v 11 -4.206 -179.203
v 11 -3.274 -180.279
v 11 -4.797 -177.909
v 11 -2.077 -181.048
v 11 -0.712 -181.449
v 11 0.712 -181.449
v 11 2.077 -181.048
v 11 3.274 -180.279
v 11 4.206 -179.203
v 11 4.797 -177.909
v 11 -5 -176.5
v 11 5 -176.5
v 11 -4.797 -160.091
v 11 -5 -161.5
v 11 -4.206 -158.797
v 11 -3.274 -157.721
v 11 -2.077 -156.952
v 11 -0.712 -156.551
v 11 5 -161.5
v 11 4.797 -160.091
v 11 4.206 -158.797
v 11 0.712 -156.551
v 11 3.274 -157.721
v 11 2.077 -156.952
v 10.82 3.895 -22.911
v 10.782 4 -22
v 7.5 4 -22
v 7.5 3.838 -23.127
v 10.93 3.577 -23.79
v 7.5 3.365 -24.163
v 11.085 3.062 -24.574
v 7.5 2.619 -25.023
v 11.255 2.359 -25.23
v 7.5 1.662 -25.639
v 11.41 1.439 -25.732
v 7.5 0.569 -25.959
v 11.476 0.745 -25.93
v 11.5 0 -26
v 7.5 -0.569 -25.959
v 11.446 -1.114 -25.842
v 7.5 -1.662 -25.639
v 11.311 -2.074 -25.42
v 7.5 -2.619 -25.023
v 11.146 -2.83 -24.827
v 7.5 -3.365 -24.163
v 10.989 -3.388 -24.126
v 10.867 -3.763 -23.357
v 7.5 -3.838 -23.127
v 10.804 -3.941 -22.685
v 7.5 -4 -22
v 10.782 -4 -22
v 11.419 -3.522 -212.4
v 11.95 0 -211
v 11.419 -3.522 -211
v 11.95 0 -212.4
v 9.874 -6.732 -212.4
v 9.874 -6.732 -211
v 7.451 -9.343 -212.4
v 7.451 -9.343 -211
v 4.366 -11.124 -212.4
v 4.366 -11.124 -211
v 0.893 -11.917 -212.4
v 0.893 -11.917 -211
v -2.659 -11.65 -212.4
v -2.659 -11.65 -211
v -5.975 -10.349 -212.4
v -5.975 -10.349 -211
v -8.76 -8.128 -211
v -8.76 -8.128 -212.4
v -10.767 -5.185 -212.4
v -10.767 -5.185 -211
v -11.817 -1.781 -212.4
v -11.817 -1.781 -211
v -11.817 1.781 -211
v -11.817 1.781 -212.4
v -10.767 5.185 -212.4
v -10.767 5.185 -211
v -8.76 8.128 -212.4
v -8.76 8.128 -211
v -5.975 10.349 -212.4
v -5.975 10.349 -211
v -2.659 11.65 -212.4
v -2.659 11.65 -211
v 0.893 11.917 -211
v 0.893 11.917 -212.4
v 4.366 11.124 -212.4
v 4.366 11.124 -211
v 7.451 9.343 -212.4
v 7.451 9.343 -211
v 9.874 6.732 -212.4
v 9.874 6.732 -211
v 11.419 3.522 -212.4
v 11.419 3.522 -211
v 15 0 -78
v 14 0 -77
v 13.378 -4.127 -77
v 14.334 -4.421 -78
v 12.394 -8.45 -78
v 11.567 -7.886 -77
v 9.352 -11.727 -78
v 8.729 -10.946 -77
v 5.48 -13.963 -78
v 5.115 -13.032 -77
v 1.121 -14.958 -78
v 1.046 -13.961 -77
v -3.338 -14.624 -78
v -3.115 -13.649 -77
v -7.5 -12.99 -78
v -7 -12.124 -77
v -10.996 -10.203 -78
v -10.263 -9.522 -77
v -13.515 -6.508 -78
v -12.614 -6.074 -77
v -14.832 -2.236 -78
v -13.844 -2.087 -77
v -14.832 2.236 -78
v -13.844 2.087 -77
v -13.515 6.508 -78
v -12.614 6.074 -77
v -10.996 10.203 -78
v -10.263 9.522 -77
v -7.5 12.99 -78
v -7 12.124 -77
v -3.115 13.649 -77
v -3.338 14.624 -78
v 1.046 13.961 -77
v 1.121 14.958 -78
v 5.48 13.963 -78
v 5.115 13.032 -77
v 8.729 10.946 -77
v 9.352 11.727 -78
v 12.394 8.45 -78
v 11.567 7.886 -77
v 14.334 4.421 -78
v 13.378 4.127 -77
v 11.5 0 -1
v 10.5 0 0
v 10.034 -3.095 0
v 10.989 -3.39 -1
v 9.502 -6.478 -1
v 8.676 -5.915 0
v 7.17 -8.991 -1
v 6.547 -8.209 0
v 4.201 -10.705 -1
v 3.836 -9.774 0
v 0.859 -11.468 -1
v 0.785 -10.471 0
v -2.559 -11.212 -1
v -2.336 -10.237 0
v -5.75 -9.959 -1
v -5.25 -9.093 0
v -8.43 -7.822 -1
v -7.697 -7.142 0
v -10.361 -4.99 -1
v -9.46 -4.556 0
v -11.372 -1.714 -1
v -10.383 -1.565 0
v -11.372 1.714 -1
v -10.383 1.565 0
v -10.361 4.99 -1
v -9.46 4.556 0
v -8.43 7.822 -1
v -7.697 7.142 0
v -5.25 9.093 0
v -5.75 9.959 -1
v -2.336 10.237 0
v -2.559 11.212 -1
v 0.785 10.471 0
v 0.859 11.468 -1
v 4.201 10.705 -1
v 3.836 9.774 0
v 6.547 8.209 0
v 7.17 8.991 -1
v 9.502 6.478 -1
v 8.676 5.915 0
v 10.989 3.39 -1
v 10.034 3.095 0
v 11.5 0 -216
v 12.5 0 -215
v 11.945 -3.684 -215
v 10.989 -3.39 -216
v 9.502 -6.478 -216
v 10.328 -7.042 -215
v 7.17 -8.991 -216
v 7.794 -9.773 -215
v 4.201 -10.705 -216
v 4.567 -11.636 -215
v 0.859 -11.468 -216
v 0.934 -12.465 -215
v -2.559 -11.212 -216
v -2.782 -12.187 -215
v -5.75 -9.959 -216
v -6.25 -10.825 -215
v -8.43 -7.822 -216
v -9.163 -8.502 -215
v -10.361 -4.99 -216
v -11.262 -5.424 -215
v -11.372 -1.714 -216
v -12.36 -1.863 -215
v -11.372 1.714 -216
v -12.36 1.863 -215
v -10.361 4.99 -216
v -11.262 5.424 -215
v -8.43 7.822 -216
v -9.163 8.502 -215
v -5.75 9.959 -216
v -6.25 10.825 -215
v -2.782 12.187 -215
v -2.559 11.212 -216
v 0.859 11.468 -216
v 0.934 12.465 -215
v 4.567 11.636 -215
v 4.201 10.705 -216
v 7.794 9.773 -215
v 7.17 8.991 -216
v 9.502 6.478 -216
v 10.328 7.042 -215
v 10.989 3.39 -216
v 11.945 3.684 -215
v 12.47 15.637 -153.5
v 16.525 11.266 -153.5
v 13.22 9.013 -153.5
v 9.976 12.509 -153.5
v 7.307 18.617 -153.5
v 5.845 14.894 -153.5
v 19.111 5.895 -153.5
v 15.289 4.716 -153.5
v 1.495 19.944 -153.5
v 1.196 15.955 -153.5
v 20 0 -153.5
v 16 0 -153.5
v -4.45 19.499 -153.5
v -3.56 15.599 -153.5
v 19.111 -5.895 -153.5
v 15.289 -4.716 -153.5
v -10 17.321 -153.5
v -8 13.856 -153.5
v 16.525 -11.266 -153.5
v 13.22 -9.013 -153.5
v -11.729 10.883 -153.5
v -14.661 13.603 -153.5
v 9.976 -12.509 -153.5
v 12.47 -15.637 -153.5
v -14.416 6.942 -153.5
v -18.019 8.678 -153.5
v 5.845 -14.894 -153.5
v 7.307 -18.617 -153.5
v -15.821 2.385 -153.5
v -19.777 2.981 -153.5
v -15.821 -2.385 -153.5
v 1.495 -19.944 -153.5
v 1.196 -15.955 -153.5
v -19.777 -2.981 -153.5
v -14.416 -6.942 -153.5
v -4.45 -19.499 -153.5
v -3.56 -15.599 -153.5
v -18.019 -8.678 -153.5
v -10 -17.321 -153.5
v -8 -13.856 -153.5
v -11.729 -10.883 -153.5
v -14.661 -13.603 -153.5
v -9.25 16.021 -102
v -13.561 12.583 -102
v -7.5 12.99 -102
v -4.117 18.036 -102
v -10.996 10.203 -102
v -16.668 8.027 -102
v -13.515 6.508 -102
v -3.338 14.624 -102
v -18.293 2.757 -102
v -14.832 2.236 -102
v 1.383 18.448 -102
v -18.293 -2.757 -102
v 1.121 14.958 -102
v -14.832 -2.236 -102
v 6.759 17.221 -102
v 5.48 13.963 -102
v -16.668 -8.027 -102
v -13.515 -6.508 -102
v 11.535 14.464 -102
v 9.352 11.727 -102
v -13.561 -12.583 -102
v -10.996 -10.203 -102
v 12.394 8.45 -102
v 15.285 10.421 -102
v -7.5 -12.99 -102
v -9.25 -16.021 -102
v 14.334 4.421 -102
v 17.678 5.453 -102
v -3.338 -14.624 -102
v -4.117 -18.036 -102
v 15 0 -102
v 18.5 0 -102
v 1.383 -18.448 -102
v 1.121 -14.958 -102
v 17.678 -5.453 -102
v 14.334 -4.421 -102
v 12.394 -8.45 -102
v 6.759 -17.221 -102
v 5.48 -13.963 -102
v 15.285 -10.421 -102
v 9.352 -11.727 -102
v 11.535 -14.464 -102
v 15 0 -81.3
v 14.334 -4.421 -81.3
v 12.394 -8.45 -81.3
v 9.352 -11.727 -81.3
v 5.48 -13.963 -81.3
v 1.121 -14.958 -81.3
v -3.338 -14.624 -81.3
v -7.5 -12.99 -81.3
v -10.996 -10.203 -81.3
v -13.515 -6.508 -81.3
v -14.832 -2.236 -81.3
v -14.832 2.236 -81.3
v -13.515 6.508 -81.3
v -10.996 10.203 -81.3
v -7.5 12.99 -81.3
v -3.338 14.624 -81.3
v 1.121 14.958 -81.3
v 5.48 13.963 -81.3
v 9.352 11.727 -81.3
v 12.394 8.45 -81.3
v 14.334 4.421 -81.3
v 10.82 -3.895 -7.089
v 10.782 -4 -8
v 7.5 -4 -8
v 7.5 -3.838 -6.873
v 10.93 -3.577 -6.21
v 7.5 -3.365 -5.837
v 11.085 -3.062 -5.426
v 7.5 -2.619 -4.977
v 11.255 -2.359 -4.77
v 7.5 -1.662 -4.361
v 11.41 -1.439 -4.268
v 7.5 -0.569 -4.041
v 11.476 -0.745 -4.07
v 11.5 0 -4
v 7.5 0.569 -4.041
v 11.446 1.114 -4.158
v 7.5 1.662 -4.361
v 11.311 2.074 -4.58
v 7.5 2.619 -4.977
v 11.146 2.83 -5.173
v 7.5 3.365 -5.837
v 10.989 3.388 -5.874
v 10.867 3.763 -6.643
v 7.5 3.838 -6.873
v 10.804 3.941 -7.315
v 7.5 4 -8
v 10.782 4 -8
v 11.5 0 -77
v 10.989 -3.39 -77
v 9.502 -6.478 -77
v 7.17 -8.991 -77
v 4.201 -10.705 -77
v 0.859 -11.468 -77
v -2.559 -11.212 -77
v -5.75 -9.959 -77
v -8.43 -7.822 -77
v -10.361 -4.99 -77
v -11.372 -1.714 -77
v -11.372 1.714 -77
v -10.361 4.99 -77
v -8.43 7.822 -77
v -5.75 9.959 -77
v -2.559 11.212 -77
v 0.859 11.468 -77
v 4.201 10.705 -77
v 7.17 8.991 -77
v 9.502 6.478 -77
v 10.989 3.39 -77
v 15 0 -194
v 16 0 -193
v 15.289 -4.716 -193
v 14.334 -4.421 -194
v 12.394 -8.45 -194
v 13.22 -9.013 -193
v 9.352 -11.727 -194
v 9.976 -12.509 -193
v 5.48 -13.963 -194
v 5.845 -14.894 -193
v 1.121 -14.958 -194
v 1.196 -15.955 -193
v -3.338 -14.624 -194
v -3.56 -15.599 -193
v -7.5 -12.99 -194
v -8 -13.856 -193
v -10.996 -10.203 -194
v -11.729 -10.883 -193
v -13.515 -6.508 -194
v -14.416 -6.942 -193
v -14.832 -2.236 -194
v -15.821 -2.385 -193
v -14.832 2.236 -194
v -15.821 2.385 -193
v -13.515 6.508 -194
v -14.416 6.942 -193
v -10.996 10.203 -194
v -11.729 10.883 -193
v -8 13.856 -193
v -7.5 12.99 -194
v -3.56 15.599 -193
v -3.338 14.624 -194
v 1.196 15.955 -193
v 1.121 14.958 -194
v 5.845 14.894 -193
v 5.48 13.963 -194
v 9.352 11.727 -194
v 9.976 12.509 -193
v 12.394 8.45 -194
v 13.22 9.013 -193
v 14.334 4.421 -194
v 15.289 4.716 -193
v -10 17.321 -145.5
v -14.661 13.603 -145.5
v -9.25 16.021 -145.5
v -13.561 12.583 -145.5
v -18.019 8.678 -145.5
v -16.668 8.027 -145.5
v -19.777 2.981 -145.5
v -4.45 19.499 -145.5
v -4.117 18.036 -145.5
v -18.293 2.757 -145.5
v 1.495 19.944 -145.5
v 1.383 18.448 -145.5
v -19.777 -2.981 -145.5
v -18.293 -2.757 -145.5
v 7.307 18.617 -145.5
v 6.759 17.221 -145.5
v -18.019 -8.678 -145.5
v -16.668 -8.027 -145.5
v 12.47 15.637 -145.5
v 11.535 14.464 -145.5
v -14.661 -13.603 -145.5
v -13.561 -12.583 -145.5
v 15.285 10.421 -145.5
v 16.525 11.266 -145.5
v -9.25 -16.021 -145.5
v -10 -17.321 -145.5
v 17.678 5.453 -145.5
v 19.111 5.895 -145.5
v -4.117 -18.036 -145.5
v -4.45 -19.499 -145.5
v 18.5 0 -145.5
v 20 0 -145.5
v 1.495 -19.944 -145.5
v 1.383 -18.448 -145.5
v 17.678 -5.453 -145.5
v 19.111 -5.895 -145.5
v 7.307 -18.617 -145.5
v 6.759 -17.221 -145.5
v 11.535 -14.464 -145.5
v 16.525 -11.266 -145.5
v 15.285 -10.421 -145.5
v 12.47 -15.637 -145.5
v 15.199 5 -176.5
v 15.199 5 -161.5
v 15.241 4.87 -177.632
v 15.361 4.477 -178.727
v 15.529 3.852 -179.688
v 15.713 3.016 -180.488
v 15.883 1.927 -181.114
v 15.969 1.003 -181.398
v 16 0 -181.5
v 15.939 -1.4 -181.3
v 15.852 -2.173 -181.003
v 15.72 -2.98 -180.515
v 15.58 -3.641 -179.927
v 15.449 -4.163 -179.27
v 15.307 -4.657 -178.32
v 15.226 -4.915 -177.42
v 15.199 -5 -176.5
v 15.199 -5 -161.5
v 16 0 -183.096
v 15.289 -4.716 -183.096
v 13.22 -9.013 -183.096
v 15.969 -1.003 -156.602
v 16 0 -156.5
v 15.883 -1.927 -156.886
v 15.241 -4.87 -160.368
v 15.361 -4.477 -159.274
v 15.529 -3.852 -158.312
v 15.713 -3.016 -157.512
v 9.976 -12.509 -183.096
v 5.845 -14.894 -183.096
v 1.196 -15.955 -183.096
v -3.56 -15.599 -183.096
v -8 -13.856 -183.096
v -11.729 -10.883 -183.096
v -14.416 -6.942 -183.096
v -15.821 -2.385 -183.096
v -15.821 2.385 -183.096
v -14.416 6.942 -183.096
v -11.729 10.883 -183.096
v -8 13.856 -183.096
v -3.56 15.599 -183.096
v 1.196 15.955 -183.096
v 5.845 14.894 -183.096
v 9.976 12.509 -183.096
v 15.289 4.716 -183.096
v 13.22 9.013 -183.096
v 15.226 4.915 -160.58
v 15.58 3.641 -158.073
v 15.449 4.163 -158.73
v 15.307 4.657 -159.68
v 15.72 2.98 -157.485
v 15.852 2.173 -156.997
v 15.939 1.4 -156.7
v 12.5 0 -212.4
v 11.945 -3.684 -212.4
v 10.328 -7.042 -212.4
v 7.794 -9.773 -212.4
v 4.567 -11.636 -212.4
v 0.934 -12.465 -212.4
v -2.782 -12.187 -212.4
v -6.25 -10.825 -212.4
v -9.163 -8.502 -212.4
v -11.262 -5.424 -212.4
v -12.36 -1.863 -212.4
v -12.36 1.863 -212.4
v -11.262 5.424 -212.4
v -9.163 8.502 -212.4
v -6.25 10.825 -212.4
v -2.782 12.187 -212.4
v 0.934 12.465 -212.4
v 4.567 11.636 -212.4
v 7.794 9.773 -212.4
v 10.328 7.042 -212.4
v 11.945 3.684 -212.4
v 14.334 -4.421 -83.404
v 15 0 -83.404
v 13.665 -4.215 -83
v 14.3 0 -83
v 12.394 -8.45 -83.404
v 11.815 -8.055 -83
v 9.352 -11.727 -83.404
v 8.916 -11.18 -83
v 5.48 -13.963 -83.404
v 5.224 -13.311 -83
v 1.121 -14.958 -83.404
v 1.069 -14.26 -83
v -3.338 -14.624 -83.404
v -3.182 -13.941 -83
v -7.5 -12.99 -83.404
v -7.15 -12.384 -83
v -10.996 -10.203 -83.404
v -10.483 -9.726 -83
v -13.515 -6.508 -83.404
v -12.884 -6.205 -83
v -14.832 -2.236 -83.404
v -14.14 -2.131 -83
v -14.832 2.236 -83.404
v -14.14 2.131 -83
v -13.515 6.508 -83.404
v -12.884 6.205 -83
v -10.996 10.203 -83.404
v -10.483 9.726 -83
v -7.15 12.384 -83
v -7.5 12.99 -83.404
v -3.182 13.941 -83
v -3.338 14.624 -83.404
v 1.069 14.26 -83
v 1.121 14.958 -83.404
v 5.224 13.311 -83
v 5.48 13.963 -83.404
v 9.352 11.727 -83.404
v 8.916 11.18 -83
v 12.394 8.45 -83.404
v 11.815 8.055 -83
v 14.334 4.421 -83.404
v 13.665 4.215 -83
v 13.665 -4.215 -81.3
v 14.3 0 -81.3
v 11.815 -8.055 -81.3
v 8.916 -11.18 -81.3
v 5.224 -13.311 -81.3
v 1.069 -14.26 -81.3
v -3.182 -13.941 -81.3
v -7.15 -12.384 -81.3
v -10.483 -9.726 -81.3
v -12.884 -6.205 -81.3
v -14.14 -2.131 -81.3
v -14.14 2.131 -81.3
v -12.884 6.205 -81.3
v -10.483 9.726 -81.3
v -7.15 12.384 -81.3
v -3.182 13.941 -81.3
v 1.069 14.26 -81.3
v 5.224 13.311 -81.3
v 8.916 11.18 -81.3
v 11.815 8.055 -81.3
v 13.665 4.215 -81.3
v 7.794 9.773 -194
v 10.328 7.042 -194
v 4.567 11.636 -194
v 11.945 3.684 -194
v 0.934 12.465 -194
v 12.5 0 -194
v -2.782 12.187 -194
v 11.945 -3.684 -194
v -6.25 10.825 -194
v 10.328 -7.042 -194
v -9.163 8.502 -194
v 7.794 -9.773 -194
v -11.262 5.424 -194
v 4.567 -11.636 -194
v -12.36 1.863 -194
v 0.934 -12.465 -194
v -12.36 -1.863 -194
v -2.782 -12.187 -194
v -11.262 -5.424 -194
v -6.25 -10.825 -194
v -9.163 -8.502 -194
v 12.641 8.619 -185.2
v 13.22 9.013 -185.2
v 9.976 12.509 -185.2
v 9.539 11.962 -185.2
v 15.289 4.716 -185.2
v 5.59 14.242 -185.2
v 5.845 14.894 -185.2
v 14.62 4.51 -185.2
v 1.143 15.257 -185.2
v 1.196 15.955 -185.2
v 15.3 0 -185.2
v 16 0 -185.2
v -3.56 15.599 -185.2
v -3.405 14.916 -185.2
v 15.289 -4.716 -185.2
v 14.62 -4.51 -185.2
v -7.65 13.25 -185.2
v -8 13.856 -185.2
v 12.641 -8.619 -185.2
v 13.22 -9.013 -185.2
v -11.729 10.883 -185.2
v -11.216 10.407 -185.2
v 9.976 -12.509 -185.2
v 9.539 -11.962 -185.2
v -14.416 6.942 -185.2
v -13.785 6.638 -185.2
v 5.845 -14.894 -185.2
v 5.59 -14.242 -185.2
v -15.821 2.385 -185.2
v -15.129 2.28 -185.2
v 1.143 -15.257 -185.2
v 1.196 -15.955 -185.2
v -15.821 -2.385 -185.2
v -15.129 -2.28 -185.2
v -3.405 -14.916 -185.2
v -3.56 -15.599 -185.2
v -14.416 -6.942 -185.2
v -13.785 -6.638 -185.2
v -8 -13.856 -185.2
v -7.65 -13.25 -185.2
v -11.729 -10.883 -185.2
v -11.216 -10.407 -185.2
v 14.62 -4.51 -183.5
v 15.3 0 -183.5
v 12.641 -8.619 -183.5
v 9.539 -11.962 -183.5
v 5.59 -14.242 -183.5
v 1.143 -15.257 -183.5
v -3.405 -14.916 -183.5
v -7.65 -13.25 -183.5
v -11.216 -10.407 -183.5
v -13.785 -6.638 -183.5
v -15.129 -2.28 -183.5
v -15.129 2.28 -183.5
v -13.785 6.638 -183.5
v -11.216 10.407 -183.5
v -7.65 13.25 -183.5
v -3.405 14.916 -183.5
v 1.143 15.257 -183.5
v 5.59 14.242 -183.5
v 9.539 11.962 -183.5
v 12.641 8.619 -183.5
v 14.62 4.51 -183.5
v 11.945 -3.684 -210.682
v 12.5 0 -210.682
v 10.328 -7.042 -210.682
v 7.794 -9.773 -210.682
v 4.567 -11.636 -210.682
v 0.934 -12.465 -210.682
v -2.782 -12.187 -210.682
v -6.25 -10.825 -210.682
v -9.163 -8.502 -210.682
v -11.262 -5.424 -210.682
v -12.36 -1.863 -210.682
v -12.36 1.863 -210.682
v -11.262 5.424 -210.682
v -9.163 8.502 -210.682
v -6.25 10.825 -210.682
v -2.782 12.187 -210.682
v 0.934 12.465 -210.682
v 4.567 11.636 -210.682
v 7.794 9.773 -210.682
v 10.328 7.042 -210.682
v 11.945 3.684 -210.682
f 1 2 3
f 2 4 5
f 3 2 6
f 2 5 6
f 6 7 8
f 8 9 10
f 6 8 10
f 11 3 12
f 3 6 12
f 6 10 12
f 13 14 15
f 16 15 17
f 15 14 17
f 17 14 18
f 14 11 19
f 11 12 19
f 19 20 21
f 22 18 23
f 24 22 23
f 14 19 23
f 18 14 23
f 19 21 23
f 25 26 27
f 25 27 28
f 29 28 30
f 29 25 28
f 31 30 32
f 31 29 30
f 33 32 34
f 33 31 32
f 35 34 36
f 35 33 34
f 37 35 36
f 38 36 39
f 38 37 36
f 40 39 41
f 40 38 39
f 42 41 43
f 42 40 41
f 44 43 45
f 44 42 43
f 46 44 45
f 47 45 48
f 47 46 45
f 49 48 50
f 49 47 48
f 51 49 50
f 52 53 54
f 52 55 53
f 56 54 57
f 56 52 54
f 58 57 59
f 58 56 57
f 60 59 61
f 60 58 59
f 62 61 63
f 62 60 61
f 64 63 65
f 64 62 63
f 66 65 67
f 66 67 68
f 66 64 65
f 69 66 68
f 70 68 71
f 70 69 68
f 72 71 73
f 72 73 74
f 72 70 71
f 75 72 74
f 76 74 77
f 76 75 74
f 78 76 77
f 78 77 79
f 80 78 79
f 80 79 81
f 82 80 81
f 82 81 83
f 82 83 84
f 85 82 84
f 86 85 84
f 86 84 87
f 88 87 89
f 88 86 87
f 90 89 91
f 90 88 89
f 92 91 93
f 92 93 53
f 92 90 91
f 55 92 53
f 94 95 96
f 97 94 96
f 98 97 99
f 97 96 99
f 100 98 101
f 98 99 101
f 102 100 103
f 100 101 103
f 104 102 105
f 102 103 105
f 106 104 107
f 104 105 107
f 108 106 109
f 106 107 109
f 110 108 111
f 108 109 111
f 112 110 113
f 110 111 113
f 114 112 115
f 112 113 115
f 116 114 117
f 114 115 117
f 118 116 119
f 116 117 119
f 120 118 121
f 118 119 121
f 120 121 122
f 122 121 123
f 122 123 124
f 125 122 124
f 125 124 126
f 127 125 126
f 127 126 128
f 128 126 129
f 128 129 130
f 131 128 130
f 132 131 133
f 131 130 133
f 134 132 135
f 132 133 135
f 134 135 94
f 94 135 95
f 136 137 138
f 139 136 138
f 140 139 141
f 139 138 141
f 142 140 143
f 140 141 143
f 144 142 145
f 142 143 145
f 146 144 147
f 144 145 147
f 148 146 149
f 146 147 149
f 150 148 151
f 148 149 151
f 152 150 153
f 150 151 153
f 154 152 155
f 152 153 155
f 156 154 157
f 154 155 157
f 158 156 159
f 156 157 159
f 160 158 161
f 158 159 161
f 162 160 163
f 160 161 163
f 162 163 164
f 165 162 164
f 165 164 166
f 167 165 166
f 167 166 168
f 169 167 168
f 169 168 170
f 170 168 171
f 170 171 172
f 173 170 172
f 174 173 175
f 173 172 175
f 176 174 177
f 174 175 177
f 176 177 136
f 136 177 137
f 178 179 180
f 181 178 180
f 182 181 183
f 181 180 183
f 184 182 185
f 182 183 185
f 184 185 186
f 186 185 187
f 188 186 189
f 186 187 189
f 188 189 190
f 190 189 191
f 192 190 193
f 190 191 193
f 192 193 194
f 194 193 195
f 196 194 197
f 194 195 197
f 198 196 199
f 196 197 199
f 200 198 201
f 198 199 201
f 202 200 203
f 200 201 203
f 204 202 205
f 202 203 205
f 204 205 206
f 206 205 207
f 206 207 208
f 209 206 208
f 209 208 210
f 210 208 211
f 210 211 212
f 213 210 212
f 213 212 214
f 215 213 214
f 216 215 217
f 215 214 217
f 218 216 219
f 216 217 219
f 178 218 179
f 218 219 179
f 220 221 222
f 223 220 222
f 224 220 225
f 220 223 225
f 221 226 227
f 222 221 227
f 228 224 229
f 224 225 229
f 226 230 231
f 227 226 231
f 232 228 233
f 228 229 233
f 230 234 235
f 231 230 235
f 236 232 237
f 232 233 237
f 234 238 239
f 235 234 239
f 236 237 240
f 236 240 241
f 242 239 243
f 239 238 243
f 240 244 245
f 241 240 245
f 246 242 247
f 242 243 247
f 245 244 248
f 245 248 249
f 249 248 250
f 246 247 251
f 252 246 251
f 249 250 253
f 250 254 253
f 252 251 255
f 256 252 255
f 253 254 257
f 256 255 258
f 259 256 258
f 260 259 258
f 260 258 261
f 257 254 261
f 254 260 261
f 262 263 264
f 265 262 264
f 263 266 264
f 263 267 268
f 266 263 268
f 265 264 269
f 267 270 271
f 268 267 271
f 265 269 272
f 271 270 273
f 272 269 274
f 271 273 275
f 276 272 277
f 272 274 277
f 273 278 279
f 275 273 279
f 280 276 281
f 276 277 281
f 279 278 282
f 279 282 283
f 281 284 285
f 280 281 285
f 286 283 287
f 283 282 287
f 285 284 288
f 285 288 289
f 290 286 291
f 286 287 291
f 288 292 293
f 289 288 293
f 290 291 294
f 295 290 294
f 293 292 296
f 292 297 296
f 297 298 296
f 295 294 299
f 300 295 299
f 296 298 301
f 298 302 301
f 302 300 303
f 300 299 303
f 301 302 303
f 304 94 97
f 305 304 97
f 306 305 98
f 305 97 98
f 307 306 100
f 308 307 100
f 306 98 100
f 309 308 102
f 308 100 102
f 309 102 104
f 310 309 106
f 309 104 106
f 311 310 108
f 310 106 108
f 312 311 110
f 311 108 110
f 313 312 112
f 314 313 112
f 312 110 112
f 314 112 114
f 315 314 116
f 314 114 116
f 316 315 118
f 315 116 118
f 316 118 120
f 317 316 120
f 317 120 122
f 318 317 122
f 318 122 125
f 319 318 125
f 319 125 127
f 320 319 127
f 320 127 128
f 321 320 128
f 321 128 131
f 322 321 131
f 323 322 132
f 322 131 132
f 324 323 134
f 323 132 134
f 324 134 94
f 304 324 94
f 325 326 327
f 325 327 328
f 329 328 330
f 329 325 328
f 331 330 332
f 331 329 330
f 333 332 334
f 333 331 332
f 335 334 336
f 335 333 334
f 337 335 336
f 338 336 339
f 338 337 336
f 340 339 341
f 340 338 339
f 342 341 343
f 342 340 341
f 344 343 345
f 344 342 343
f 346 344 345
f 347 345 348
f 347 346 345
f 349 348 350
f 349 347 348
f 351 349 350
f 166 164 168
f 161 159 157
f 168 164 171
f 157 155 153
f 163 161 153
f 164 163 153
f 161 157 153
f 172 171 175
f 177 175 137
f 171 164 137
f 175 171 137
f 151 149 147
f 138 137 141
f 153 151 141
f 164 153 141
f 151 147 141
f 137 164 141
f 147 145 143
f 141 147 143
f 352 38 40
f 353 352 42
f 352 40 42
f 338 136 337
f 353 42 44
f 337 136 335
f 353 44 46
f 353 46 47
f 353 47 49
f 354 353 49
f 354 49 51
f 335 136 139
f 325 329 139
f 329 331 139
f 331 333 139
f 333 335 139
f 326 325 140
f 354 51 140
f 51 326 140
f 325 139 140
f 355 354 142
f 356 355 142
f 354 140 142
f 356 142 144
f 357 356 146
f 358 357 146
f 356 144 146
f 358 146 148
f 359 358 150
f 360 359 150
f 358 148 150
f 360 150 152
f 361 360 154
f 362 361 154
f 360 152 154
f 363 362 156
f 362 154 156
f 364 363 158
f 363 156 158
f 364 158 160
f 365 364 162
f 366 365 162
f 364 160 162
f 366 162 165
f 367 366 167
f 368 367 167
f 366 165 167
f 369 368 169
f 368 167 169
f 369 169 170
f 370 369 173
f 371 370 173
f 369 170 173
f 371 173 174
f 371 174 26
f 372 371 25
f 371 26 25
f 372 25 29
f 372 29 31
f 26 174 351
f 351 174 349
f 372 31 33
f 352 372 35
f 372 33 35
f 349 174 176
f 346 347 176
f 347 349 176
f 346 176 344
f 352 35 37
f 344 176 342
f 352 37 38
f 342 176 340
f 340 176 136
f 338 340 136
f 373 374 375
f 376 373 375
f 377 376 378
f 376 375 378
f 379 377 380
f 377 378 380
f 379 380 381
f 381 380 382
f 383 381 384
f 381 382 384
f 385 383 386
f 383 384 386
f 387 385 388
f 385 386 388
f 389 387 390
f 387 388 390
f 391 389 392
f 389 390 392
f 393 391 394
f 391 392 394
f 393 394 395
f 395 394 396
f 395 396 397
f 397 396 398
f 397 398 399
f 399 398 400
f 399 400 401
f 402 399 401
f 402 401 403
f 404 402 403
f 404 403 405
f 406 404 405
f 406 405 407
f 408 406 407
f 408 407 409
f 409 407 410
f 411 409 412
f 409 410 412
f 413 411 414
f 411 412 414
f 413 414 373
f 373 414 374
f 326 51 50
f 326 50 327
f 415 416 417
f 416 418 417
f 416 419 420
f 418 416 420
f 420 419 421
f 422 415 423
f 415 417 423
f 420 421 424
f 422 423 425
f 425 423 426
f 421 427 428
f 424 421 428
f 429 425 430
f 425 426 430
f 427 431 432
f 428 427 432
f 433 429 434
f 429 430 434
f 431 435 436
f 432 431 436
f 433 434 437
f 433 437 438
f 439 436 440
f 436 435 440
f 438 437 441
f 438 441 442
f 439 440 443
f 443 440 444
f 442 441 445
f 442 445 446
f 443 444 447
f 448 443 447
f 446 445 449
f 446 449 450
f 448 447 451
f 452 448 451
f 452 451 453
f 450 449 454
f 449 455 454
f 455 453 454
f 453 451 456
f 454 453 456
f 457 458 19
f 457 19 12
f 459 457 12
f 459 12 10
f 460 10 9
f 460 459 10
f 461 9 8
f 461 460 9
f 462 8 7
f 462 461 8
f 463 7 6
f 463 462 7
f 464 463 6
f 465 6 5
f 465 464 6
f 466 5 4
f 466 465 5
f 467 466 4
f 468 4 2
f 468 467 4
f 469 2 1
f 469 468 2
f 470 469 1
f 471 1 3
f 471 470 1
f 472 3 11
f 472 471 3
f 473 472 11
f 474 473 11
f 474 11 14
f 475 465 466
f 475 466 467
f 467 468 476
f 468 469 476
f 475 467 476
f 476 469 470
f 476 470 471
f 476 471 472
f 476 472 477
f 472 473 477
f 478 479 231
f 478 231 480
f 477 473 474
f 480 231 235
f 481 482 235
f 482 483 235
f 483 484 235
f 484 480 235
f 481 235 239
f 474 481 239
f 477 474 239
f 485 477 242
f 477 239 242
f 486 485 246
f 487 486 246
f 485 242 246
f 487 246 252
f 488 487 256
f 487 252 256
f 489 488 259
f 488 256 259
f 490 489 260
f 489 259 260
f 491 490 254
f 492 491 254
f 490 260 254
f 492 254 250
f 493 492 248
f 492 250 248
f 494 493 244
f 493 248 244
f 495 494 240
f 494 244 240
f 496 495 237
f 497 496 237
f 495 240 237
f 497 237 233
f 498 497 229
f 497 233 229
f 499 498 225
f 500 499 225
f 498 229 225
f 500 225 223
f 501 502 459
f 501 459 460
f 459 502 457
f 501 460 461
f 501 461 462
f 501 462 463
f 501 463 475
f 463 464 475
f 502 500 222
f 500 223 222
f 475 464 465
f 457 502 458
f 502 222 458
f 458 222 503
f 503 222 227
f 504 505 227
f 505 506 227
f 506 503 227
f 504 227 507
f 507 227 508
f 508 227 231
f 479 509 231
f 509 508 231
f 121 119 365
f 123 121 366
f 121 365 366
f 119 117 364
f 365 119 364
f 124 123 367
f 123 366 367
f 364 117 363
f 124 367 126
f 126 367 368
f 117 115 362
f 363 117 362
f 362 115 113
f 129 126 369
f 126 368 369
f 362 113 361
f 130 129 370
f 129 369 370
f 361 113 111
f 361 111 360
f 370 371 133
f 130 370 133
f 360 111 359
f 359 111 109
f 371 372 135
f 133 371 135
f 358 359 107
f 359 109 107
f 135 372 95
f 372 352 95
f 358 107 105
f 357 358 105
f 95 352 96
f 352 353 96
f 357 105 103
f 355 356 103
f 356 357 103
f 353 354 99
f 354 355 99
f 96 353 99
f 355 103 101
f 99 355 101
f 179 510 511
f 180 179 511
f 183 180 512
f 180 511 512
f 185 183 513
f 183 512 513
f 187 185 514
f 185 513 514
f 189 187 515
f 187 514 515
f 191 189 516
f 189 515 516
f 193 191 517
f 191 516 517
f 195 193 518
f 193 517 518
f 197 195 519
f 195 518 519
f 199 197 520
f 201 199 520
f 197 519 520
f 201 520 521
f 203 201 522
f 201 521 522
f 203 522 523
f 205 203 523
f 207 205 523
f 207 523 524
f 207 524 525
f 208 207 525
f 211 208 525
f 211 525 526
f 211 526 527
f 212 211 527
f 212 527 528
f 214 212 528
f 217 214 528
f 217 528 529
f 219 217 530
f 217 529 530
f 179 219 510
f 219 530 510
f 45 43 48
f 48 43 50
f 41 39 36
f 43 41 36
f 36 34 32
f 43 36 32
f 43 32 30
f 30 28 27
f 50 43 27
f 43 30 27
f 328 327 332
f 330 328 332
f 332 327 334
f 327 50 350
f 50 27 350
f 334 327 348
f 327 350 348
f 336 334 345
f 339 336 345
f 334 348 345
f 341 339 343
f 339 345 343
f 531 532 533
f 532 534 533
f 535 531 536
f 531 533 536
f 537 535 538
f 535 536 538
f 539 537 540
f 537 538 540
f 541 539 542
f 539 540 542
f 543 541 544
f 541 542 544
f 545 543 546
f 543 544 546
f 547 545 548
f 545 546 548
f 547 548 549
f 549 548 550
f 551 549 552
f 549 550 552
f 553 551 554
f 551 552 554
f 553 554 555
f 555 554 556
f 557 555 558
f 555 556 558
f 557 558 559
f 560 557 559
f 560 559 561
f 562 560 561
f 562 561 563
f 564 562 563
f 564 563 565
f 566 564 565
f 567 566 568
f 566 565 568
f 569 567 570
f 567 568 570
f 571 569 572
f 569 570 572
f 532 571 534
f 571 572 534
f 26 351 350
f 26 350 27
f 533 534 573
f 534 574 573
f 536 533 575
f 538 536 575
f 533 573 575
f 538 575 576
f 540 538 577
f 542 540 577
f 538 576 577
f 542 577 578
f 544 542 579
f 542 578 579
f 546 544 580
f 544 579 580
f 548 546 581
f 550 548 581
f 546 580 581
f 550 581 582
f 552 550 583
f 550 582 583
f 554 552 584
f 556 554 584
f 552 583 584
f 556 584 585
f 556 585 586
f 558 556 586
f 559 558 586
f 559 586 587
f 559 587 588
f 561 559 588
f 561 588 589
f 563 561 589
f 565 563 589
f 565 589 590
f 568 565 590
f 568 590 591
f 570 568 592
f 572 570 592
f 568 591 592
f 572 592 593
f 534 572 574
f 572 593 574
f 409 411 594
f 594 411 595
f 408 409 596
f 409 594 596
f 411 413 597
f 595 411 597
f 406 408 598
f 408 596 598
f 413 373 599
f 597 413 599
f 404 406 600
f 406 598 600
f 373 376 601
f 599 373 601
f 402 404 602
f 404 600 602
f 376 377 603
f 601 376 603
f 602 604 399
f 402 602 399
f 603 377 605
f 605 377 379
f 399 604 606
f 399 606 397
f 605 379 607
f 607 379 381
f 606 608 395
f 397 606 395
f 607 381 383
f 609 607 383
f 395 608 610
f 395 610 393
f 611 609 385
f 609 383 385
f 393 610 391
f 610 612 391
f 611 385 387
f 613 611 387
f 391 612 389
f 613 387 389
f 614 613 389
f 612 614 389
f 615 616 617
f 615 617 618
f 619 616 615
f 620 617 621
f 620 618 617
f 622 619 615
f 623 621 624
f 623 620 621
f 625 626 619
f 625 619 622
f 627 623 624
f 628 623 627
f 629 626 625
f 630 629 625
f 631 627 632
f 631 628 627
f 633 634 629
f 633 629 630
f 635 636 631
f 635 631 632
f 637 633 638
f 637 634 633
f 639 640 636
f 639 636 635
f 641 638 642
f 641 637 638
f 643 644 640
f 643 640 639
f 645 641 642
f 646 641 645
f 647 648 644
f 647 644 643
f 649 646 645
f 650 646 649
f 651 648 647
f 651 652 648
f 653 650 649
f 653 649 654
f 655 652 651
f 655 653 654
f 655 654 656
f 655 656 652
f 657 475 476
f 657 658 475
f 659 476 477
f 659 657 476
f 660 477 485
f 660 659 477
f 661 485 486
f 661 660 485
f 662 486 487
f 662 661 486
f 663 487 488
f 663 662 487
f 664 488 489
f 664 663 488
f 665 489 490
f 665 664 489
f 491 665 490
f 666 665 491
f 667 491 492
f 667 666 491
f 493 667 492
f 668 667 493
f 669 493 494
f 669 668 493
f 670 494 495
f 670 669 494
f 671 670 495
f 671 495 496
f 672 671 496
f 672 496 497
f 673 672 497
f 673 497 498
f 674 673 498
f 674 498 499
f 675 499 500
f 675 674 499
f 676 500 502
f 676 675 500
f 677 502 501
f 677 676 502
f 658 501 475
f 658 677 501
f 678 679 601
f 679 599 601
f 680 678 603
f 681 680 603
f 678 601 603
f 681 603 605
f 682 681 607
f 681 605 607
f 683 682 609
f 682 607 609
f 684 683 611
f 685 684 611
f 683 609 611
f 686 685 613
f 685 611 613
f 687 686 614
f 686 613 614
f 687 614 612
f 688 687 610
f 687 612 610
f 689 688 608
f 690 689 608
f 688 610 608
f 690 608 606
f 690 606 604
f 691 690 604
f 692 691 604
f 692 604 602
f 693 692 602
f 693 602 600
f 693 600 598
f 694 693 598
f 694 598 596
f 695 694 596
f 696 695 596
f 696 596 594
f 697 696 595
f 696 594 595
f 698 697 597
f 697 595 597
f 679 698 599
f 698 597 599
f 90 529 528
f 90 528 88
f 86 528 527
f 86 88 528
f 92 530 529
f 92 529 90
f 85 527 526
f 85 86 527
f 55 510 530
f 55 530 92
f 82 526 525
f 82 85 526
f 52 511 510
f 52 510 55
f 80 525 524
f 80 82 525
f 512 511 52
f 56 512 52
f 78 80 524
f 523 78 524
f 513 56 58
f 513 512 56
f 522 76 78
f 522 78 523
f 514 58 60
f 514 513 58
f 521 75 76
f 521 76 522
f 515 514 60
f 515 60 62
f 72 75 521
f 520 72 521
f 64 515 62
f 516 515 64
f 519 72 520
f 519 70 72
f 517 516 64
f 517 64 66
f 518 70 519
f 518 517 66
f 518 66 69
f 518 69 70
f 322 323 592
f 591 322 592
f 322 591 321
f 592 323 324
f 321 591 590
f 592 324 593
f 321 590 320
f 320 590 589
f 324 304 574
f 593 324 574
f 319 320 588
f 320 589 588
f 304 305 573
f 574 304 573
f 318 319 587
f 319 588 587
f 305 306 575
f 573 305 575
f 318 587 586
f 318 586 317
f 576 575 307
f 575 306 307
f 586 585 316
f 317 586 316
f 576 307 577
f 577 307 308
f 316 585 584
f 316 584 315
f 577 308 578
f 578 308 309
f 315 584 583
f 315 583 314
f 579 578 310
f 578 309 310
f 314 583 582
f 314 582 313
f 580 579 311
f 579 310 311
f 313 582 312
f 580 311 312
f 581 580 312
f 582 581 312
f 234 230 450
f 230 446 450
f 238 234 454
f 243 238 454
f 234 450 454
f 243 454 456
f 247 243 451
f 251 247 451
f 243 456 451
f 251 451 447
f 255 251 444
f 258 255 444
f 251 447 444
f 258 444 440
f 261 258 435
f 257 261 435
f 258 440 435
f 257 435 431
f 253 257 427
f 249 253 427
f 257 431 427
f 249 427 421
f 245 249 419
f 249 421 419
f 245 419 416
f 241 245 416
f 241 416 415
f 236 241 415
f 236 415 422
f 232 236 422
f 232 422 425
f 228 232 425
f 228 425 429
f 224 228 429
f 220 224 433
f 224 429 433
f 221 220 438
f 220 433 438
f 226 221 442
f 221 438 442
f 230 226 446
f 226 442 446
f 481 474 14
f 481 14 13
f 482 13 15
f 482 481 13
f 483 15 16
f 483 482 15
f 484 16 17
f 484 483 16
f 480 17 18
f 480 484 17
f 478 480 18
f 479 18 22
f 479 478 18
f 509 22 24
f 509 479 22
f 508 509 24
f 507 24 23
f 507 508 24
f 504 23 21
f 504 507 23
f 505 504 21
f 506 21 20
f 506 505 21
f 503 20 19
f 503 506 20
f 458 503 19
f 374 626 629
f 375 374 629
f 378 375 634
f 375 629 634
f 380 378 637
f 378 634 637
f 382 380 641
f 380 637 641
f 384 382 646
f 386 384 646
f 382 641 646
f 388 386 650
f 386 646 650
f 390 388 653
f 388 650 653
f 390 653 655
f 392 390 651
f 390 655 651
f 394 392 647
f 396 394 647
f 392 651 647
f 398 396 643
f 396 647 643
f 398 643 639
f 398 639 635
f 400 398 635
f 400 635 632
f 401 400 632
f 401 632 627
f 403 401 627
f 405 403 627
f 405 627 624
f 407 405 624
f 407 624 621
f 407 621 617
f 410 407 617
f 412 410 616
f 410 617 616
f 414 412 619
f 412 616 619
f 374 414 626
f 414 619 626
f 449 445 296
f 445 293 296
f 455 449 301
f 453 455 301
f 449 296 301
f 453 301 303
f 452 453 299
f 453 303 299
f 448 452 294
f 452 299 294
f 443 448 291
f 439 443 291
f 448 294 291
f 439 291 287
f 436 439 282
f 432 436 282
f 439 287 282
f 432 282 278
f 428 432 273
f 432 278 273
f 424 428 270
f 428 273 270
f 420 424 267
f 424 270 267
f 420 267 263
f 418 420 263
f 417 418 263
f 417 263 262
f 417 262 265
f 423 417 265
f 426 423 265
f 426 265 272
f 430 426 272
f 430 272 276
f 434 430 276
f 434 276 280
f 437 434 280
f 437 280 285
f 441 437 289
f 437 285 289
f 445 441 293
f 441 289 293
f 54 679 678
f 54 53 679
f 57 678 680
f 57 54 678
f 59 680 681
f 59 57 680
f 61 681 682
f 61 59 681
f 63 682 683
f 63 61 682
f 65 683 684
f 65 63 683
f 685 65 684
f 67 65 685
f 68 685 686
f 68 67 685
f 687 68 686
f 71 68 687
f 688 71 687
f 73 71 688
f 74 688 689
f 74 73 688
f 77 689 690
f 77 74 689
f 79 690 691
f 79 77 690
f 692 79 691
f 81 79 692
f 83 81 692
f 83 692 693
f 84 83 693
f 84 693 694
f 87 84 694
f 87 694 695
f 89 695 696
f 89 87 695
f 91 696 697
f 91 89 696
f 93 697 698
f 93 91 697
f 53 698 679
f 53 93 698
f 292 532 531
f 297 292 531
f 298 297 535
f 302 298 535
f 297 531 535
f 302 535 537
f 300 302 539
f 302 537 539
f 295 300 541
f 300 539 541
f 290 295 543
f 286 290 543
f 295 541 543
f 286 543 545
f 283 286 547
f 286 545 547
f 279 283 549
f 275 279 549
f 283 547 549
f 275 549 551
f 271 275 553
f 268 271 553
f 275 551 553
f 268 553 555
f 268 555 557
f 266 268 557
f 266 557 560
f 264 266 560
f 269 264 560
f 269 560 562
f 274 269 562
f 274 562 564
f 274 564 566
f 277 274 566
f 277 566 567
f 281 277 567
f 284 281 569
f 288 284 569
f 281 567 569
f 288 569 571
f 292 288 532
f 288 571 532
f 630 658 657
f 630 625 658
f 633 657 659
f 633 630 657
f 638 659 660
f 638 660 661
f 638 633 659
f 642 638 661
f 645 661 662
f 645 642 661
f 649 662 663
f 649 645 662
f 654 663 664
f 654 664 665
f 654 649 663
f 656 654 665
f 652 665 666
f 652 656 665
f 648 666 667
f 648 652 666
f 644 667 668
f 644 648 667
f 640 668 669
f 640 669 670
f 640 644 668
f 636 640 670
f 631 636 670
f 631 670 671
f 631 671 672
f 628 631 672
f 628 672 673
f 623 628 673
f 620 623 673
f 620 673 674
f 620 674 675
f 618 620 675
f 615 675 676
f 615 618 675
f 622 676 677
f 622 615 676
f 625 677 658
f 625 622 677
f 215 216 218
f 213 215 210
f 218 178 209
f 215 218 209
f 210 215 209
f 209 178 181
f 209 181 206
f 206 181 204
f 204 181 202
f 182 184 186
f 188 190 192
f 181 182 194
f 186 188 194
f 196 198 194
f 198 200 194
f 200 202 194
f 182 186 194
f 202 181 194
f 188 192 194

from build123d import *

# Parameters (mm, degrees)
TAGLIO_ESTRUSIONE4_START = 16
TAGLIO_ESTRUSIONE4_DEPTH = 5
TAGLIO_ESTRUSIONE5_START = 11.5
TAGLIO_ESTRUSIONE5_DEPTH = 4
SMUSSO5_SIZE             = 1


with BuildPart() as part:
    # Schizzo4 → Rivoluzione1 (revolve)
    with BuildSketch(Plane(origin=(0, 0, 0), x_dir=(0, 0, -1), z_dir=(1, 0, 0)), mode=Mode.PRIVATE) as rivoluzione1_sk:
        Polygon((0, 0), (216, 0), (216, 12.5), (194, 12.5), (194, 16), (153.5, 16), (153.5, 20), (145.5, 20), (145.5, 18.5), (102, 18.5), (102, 15), (77, 15), (77, 11.5), (0, 11.5), align=None)
    revolve(rivoluzione1_sk.sketch.rotate(Axis((0, 0, 0), (0, 0, -1)), 90), axis=Axis((0, 0, 0), (0, 0, -1)))

    # Schizzo10 → Taglia-Rivoluzione1 (revolve, cut)
    with BuildSketch(Plane(origin=(0, 0, 0), x_dir=(0, 0, -1), z_dir=(1, 0, 0)), mode=Mode.PRIVATE) as taglia_rivoluzione1_sk:
        Polygon((183.095854812, 16), (183.5, 15.3), (185.2, 15.3), (185.2, 16), align=None)
    revolve(taglia_rivoluzione1_sk.sketch.rotate(Axis((0, 0, -141.39065809), (0, 0, -1)), 90), axis=Axis((0, 0, -141.39065809), (0, 0, -1)), mode=Mode.SUBTRACT)

    # Schizzo11 → Taglia-Rivoluzione2 (revolve, cut)
    with BuildSketch(Plane(origin=(0, 0, 0), x_dir=(0, 0, -1), z_dir=(1, 0, 0)), mode=Mode.PRIVATE) as taglia_rivoluzione2_sk:
        Polygon((210.682457352, 12.5), (211, 11.95), (212.4, 11.95), (212.4, 12.5), align=None)
    revolve(taglia_rivoluzione2_sk.sketch.rotate(Axis((0, 0, -146.205163042), (0, 0, -1)), 90), axis=Axis((0, 0, -146.205163042), (0, 0, -1)), mode=Mode.SUBTRACT)

    # Schizzo12 → Taglia-Rivoluzione3 (revolve, cut)
    with BuildSketch(Plane(origin=(0, 0, 0), x_dir=(0, 0, -1), z_dir=(1, 0, 0)), mode=Mode.PRIVATE) as taglia_rivoluzione3_sk:
        Polygon((83.404145188, 15), (83, 14.3), (81.3, 14.3), (81.3, 15), align=None)
    revolve(taglia_rivoluzione3_sk.sketch.rotate(Axis((0, 0, -46.884155284), (0, 0, -1)), 90), axis=Axis((0, 0, -46.884155284), (0, 0, -1)), mode=Mode.SUBTRACT)

    # Schizzo6 → Taglio-Estrusione4 (cut)
    with BuildSketch(Plane(origin=(0, 0, 0), x_dir=(0, 0, -1), z_dir=(1, 0, 0)).offset(TAGLIO_ESTRUSIONE4_START)):
        with BuildLine():
            Line((161.5, 5), (176.5, 5))
            ThreePointArc((176.5, 5), (181.5, 0), (176.5, -5))
            Line((176.5, -5), (161.5, -5))
            ThreePointArc((161.5, -5), (156.5, 0), (161.5, 5))
        make_face()
    extrude(amount=-TAGLIO_ESTRUSIONE4_DEPTH, mode=Mode.SUBTRACT)

    # Schizzo8 → Taglio-Estrusione5 (cut)
    with BuildSketch(Plane(origin=(0, 0, 0), x_dir=(0, 0, -1), z_dir=(1, 0, 0)).offset(TAGLIO_ESTRUSIONE5_START)):
        with BuildLine():
            Line((8, 4), (22, 4))
            ThreePointArc((22, 4), (26, 0), (22, -4))
            Line((22, -4), (8, -4))
            ThreePointArc((8, -4), (4, 0), (8, 4))
        make_face()
    extrude(amount=-TAGLIO_ESTRUSIONE5_DEPTH, mode=Mode.SUBTRACT)

    # Smusso5
    smusso5_edges = [part.edges().sort_by_distance(p)[0] for p in [
        (-11.5, 0, 0),
        (-15, 0, -77),
        (-16, 0, -194),
        (-12.5, 0, -216),
    ]]
    chamfer(smusso5_edges, length=SMUSSO5_SIZE)


solid = part.part
